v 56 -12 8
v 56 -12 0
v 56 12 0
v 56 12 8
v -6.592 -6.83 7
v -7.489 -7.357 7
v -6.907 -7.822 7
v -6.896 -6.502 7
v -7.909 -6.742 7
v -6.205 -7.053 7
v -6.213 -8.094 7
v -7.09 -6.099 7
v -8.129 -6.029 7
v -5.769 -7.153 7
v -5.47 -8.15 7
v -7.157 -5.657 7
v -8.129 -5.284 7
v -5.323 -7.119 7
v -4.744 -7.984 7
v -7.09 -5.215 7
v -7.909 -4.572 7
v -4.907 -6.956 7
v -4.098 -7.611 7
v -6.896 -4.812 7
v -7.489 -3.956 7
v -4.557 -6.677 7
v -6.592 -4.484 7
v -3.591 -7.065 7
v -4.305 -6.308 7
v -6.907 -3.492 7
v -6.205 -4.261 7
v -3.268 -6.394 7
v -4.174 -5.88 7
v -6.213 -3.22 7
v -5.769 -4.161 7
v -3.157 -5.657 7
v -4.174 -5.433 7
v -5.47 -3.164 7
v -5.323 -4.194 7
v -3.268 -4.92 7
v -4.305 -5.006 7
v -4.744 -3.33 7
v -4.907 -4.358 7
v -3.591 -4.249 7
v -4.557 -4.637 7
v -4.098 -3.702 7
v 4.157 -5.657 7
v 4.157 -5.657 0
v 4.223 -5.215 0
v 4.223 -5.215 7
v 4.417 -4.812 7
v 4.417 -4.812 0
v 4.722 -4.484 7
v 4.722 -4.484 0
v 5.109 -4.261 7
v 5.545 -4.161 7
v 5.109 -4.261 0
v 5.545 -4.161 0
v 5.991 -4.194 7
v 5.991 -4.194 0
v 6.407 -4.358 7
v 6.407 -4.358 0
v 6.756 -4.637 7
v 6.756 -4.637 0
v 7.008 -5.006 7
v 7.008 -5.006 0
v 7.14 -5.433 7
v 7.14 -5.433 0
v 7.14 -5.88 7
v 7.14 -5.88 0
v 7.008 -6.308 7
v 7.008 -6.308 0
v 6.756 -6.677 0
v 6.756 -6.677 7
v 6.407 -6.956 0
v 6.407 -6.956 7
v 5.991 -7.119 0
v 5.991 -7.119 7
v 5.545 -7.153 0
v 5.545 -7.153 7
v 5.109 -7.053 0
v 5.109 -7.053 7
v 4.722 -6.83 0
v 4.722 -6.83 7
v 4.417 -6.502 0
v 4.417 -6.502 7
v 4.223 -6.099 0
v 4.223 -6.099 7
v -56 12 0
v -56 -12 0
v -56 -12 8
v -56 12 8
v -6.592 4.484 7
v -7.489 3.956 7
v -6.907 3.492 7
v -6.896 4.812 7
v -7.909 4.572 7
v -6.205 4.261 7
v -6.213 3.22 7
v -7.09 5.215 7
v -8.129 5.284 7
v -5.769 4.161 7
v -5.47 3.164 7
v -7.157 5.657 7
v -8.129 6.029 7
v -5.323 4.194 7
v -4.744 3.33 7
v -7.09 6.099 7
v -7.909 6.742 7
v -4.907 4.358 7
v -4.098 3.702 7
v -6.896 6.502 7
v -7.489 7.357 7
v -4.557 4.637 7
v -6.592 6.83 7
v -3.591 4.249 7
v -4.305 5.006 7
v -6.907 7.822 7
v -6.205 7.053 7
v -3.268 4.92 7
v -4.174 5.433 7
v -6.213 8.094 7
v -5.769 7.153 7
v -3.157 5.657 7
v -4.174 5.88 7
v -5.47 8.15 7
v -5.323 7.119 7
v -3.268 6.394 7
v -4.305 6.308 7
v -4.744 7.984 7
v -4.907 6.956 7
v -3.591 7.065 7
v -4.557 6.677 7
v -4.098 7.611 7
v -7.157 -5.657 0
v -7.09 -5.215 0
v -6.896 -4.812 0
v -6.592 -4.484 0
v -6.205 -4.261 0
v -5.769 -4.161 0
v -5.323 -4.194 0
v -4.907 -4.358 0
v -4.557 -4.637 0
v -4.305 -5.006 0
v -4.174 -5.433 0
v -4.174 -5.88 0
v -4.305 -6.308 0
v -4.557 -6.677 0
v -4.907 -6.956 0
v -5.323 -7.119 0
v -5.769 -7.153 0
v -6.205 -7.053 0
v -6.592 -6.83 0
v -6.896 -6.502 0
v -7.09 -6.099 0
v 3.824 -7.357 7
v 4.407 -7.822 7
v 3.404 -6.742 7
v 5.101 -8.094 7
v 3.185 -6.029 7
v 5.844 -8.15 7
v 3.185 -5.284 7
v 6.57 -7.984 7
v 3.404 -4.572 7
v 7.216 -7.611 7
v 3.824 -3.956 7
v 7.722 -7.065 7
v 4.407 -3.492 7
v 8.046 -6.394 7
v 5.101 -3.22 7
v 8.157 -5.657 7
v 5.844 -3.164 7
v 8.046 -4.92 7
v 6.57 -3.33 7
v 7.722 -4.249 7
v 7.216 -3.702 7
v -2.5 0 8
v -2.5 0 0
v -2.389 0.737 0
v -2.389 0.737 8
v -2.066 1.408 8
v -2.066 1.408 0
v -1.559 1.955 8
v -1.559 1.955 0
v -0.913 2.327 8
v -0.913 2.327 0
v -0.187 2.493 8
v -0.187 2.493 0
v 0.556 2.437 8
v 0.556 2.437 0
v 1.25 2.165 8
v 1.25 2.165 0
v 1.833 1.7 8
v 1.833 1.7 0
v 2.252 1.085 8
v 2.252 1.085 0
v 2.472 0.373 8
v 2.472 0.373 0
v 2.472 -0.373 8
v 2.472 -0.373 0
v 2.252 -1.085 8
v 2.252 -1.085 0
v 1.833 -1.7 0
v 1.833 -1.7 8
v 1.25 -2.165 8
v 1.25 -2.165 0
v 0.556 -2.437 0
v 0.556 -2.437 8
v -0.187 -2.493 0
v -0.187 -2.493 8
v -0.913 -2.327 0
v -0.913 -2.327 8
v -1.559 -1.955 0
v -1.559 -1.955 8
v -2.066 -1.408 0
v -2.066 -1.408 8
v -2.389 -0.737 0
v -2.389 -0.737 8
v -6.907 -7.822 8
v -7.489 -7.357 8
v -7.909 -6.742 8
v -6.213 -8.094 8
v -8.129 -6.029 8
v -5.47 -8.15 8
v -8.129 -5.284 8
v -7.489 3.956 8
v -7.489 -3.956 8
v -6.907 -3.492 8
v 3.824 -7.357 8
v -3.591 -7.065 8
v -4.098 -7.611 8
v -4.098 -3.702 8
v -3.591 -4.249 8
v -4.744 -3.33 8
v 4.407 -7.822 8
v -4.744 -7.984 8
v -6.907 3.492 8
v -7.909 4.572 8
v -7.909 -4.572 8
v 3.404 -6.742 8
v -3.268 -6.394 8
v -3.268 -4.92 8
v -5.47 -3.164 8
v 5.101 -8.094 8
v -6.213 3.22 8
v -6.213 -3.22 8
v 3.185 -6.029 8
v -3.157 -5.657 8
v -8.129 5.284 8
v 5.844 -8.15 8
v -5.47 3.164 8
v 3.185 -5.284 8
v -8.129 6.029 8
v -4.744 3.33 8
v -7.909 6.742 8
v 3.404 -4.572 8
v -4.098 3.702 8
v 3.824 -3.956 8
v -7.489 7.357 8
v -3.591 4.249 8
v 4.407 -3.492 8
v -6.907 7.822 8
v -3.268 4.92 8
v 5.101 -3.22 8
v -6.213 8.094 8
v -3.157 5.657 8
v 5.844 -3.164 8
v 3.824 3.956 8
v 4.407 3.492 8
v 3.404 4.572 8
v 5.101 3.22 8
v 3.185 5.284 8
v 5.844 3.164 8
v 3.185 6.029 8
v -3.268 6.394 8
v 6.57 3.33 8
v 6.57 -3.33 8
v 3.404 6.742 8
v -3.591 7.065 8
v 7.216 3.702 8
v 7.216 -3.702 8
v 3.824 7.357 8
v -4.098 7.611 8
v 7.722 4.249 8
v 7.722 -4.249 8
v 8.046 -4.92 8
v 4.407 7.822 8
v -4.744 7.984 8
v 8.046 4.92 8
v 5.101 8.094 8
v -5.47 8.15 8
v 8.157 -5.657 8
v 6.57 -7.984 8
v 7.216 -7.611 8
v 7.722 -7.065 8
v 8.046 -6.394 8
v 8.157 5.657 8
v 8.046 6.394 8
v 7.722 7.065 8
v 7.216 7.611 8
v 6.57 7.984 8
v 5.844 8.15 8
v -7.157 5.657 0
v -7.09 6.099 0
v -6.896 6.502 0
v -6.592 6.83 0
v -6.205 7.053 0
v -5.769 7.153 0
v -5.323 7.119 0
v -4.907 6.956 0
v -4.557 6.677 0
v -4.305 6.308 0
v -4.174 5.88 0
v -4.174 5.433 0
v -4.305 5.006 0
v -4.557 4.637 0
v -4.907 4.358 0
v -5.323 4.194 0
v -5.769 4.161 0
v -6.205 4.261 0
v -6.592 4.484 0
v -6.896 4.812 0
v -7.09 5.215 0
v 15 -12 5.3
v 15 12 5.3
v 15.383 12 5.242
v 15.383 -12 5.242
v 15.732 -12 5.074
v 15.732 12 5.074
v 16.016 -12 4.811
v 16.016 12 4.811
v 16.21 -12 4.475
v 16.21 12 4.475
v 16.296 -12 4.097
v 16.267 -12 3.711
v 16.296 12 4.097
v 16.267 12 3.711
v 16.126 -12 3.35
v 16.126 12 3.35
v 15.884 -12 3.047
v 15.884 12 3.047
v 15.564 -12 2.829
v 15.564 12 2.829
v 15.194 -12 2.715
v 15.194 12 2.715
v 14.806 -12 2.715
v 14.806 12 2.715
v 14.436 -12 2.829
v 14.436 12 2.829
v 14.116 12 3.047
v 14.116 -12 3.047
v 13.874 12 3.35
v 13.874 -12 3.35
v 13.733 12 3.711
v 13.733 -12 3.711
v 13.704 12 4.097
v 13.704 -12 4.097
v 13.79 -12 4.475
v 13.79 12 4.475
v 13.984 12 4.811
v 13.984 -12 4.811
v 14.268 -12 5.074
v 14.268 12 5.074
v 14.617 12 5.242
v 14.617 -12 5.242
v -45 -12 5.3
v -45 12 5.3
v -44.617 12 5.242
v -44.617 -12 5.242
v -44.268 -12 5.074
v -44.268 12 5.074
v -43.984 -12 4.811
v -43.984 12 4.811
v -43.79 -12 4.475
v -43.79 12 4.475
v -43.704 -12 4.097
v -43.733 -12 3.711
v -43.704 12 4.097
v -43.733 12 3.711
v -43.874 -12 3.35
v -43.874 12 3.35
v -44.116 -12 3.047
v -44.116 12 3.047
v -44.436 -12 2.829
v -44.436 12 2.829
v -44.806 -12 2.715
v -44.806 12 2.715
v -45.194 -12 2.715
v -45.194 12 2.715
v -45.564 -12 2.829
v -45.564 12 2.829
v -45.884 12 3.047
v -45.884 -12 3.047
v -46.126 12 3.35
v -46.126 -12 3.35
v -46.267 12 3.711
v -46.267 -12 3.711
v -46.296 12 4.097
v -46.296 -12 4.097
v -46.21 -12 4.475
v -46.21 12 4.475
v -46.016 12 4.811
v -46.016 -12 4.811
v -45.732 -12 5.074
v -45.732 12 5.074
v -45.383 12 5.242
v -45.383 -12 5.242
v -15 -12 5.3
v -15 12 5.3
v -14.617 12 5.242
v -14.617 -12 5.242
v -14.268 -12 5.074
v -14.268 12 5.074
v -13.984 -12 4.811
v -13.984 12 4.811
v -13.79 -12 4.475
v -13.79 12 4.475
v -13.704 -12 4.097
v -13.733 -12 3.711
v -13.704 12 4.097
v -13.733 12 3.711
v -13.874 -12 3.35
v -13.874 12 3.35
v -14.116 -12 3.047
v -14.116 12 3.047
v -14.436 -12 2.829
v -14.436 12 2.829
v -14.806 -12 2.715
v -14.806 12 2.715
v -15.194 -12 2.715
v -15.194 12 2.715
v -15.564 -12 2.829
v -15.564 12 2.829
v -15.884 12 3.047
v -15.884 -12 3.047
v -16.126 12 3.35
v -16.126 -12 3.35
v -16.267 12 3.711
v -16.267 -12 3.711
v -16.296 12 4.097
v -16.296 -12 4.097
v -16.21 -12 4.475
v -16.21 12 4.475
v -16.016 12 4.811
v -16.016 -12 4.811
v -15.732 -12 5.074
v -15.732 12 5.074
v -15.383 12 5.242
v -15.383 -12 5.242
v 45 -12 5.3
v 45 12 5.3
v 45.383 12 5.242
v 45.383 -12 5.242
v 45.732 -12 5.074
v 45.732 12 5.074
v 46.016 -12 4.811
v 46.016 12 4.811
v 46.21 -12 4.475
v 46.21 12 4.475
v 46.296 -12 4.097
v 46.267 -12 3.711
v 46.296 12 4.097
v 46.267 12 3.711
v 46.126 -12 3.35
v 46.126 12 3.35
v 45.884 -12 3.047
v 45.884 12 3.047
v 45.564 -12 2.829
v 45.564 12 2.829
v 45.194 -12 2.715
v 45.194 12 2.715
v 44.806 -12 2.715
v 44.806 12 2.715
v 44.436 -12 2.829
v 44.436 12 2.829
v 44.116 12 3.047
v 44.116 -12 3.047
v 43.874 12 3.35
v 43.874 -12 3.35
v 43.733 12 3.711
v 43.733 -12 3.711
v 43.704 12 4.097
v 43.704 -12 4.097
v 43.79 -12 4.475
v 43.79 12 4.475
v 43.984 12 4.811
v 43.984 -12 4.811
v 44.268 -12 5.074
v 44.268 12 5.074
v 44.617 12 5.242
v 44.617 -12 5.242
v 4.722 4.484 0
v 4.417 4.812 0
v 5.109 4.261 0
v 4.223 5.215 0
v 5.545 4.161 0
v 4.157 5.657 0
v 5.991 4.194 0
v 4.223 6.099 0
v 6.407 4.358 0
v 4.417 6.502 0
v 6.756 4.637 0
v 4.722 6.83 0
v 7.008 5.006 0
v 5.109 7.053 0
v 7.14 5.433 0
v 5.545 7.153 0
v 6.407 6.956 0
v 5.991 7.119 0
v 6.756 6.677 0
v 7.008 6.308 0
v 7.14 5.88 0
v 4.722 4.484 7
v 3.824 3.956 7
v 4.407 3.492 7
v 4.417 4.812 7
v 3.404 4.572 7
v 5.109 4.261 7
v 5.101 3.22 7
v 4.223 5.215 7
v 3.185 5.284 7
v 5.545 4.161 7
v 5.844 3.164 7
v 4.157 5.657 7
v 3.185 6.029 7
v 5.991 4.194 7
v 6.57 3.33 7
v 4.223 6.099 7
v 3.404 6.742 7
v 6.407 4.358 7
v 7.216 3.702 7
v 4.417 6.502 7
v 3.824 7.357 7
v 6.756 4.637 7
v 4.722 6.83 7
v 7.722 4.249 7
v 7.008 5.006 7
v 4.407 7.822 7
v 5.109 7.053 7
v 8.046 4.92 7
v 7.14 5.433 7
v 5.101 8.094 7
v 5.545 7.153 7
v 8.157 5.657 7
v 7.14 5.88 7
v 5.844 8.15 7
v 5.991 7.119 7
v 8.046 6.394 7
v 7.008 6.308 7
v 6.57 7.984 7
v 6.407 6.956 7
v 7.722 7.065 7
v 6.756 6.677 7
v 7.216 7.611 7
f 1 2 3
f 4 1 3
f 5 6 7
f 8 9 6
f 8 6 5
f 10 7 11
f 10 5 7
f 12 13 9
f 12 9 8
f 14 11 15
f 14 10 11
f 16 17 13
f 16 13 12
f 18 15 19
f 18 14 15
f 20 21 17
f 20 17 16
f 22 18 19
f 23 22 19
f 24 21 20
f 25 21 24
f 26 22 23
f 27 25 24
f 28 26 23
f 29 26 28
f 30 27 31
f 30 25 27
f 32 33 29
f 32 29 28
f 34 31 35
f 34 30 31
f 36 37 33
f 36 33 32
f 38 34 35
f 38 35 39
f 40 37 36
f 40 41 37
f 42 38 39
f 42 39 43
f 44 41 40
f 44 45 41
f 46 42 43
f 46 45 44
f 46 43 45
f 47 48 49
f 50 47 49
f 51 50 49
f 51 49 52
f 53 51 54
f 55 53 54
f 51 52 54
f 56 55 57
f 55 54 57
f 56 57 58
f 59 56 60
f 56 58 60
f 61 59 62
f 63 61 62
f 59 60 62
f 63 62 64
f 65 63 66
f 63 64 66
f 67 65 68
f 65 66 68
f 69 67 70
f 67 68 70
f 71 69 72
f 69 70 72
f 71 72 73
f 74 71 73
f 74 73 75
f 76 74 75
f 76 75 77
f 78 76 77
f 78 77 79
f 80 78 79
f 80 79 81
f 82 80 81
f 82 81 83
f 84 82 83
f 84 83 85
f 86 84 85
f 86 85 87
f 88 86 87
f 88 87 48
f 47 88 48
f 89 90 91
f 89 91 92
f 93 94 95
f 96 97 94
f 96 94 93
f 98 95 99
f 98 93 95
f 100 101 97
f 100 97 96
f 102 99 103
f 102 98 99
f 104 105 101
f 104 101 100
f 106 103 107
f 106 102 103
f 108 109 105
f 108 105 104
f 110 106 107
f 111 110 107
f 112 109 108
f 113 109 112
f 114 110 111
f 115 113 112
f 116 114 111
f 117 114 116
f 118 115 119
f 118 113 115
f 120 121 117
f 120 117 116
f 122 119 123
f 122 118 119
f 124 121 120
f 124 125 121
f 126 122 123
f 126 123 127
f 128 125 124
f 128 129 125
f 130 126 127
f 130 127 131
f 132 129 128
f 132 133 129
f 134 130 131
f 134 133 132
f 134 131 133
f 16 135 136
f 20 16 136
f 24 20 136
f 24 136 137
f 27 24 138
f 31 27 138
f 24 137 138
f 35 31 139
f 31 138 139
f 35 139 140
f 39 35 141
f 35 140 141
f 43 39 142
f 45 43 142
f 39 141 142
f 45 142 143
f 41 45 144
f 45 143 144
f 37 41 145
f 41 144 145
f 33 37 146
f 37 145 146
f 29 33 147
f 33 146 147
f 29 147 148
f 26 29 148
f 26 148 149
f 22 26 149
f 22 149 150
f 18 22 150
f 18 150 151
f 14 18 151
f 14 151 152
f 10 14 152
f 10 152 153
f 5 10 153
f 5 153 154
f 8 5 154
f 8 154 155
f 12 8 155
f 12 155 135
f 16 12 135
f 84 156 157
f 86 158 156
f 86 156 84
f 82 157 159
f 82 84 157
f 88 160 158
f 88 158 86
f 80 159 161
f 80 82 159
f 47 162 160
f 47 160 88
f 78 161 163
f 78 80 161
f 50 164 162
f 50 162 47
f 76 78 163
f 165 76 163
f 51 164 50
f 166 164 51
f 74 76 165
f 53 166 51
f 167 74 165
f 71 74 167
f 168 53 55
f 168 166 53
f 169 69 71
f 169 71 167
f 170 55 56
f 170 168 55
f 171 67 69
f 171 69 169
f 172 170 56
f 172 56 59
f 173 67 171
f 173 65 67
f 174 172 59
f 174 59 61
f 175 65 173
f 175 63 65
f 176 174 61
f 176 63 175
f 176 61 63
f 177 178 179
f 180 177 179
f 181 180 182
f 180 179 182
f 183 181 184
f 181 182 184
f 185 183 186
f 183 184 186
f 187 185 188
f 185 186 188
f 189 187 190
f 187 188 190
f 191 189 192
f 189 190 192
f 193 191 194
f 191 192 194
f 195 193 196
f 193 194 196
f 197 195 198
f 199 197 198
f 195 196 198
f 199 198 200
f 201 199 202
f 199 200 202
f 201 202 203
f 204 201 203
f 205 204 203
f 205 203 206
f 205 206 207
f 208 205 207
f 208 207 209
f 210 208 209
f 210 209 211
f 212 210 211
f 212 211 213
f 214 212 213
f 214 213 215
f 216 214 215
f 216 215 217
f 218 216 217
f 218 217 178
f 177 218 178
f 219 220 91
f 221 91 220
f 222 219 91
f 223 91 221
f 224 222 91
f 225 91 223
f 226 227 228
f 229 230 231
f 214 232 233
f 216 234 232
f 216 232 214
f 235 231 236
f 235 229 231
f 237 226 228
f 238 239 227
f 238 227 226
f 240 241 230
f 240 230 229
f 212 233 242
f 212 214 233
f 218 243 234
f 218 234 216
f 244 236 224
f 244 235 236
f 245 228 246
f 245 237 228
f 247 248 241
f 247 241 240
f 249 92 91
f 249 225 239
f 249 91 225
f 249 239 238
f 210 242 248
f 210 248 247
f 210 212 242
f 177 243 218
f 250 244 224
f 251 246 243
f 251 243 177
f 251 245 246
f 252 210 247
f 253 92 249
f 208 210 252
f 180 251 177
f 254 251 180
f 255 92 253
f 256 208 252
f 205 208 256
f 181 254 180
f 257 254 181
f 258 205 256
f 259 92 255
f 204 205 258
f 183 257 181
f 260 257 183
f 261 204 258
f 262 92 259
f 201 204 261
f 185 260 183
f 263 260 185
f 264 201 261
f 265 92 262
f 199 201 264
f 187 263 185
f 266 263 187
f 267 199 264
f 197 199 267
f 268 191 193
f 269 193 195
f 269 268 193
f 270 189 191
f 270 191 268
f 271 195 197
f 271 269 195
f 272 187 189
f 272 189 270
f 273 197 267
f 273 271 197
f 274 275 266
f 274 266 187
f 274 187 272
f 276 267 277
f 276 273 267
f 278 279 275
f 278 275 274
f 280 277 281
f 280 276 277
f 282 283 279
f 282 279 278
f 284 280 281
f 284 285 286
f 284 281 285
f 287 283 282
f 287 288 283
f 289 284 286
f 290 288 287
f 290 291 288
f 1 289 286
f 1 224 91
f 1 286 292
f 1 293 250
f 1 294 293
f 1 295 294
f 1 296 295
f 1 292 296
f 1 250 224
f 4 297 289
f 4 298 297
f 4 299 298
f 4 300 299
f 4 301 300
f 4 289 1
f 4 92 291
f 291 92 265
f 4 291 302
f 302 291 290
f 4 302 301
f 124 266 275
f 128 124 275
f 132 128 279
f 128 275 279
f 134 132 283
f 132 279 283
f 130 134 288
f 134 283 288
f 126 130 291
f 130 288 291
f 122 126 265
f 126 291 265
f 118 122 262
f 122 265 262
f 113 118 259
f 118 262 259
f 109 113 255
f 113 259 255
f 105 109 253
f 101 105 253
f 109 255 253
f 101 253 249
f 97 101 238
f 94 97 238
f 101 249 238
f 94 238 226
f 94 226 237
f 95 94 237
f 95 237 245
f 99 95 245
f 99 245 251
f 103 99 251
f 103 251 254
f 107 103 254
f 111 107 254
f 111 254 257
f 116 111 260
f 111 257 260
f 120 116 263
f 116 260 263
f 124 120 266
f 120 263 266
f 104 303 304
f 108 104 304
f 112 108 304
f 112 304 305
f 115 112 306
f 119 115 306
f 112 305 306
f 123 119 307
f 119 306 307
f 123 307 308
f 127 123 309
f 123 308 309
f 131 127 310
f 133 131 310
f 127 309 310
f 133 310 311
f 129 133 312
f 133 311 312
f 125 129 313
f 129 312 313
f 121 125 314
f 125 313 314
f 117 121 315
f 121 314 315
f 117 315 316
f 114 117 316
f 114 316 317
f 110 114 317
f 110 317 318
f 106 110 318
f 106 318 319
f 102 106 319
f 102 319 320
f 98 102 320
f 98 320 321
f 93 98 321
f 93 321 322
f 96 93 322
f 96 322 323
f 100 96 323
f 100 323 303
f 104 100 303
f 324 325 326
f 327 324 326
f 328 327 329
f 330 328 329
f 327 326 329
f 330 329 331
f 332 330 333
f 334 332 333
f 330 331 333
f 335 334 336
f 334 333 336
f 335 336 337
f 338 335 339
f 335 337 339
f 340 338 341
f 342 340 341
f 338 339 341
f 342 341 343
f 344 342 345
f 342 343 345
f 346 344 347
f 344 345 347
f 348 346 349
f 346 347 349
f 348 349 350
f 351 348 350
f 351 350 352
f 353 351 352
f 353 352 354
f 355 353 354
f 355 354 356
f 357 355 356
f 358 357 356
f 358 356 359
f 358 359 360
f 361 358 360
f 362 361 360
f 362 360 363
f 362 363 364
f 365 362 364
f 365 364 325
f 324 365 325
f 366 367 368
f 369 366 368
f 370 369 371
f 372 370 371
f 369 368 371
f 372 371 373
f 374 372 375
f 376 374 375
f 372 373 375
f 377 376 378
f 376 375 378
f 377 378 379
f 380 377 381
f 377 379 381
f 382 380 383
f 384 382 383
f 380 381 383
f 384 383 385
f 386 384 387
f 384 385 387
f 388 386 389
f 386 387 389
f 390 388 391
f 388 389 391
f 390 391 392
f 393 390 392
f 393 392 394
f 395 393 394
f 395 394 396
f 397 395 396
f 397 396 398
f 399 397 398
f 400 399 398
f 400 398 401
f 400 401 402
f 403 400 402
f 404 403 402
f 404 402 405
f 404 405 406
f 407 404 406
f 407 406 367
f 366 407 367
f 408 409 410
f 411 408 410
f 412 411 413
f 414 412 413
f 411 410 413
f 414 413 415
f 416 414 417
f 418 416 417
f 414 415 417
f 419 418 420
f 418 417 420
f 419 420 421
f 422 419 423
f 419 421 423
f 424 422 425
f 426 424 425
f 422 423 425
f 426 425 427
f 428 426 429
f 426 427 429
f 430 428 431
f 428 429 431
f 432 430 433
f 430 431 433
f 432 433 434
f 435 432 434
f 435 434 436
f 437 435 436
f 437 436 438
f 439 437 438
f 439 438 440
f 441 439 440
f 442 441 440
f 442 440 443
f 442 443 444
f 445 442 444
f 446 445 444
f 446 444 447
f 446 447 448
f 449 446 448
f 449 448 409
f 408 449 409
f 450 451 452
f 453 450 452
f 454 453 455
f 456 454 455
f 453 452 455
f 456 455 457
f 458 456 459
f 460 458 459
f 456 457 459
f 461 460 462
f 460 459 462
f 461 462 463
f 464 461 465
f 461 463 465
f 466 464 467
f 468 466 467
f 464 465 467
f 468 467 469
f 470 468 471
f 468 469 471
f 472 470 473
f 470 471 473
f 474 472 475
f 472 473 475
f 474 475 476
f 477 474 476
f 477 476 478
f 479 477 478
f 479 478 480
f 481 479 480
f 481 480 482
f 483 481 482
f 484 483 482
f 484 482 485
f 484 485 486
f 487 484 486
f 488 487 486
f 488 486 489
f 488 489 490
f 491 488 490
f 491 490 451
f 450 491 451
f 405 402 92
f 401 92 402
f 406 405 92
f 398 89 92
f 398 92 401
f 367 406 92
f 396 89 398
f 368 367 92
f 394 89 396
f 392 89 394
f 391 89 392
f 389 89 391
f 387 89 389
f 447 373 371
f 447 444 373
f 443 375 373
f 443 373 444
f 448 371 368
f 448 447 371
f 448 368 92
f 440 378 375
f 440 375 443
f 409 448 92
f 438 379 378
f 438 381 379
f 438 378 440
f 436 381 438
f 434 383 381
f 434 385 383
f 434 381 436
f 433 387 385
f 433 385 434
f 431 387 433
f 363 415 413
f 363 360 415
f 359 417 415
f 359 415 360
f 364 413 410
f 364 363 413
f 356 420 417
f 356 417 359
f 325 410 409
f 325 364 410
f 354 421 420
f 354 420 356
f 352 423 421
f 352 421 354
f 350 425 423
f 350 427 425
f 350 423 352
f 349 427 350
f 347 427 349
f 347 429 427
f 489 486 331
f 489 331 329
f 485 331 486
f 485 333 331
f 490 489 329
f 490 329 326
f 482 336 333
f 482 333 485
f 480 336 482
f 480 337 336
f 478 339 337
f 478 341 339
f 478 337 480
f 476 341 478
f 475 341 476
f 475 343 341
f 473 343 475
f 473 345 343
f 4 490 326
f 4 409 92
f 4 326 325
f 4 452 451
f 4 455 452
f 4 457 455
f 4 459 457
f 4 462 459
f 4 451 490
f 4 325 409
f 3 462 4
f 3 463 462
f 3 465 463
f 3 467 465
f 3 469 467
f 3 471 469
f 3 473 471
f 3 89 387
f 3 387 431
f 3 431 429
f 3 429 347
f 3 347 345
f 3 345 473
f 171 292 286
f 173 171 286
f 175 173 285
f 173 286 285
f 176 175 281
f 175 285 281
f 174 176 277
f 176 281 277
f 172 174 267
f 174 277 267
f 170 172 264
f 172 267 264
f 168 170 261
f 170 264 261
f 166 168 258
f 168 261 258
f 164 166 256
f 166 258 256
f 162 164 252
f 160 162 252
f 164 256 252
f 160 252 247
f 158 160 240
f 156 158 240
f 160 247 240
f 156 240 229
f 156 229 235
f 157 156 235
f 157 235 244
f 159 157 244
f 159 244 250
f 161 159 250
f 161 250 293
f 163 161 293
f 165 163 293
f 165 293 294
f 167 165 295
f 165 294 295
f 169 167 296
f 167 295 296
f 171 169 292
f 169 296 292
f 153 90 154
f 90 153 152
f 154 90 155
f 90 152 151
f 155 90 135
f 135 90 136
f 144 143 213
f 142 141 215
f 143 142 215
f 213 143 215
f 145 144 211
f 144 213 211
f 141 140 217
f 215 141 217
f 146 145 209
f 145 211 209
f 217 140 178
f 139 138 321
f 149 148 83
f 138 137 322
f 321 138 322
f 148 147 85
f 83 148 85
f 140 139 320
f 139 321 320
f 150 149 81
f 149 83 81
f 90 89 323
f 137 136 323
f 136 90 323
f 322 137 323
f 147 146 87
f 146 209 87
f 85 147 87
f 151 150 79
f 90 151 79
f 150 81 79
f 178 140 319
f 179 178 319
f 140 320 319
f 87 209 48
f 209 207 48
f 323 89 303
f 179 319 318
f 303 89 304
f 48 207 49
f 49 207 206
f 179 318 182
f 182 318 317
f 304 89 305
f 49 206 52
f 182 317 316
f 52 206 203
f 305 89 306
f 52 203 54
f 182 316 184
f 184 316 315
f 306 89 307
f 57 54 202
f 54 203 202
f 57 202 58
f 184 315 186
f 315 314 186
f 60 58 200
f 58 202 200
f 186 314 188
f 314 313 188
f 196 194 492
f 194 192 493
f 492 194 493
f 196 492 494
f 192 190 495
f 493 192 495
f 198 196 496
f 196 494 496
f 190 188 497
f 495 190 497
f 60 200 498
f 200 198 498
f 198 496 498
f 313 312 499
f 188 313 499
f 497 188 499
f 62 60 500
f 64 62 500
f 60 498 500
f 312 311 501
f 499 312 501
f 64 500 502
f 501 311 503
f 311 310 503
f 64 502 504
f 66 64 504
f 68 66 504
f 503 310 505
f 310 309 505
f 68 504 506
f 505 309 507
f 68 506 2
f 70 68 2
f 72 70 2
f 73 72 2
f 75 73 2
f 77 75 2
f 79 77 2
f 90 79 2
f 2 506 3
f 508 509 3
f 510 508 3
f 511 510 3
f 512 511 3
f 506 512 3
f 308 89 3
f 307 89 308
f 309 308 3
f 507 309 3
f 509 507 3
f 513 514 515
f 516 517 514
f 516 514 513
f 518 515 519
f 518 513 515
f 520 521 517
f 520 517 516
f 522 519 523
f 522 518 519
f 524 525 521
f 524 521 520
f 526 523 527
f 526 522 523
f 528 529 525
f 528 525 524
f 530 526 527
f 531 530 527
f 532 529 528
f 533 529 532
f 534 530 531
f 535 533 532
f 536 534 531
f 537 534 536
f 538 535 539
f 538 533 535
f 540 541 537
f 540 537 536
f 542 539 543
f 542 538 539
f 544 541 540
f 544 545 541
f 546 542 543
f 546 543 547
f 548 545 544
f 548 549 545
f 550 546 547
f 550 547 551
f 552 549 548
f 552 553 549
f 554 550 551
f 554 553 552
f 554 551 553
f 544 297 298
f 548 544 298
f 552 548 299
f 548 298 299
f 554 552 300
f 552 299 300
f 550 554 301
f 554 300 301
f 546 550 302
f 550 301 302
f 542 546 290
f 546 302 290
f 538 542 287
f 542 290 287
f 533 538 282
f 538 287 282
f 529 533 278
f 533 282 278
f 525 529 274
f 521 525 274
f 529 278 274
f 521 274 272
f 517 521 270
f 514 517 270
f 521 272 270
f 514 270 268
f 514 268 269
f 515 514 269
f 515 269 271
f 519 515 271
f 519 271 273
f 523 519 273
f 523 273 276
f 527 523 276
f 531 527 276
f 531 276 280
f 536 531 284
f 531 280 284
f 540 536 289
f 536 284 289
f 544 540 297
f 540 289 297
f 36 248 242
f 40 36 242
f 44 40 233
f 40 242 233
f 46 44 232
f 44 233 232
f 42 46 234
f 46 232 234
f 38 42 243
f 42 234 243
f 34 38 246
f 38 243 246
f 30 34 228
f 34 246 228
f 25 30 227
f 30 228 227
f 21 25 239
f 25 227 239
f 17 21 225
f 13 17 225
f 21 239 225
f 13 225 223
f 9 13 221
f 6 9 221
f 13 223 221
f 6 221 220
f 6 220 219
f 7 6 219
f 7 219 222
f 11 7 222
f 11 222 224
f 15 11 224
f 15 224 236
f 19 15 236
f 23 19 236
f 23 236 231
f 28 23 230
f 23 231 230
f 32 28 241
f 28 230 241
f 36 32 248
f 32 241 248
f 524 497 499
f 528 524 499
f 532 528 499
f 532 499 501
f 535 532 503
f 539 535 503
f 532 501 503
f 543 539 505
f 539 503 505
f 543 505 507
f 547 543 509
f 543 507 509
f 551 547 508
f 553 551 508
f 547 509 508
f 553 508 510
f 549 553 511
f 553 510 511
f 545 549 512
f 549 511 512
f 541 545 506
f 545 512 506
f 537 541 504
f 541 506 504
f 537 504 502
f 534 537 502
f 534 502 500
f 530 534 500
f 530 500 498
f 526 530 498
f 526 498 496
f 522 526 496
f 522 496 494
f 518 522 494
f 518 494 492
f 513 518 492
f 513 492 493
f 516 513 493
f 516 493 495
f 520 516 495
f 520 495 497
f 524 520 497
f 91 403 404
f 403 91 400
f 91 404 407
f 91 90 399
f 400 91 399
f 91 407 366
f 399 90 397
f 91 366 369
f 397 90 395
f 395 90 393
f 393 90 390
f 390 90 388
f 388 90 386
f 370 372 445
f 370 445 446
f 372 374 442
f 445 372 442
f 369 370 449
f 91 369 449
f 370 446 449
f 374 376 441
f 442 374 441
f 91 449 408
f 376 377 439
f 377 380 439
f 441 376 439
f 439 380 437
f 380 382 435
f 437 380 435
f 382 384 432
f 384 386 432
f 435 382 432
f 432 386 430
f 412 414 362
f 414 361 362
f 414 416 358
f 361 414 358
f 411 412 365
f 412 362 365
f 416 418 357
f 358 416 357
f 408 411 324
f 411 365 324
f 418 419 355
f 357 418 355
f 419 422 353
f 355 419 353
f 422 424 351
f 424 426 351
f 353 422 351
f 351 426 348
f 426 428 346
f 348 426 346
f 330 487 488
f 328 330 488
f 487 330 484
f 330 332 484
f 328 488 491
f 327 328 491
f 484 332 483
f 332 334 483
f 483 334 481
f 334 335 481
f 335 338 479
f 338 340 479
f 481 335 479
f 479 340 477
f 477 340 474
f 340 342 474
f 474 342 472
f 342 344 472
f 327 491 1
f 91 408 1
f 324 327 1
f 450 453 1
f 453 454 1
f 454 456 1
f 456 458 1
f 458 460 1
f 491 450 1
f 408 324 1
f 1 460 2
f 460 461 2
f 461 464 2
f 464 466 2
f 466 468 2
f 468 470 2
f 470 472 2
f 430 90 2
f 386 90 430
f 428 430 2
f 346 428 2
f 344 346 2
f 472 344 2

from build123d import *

# Parameters (mm, degrees)
SKETCH_1_W          = 112
SKETCH_1_H          = 24
EXTRUDE_1_DEPTH     = 8
SKETCH_2_R          = 1.3
CUT_EXTRUDE_1_DEPTH = 30
SKETCH_3_R          = 2.5
SKETCH_3_R_2        = 1.5
CUT_EXTRUDE_2_DEPTH = 58.827329179
SKETCH_5_R          = 2.5
CUT_EXTRUDE_4_DEPTH = 1


with BuildPart() as part:
    # 草图1 → 凸台-拉伸1 (new body)
    with BuildSketch(Plane.XY):
        Rectangle(SKETCH_1_W, SKETCH_1_H)
    extrude(amount=EXTRUDE_1_DEPTH)

    # 草图2 → 切除-拉伸1 (cut)
    with BuildSketch(Plane(origin=(0, 12, 0), x_dir=(1, 0, 0), z_dir=(0, 1, 0))):
        with Locations(Location((-15, -4, 0), (0, 0, 270))):
            Circle(SKETCH_2_R)
        with Locations(Location((-45, -4, 0), (0, 0, 270))):
            Circle(SKETCH_2_R)
        with Locations(Location((45, -4, 0), (0, 0, 270))):
            Circle(SKETCH_2_R)
        with Locations(Location((15, -4, 0), (0, 0, 270))):
            Circle(SKETCH_2_R)
    extrude(amount=-CUT_EXTRUDE_1_DEPTH, mode=Mode.SUBTRACT)

    # 草图3 → 切除-拉伸2 (cut, through all)
    with BuildSketch(Plane(origin=(0, 0, 0), x_dir=(-1, 0, 0), z_dir=(0, 0, -1))):
        Circle(SKETCH_3_R)
        with Locations((-5.656854249, -5.656854249)):
            Circle(SKETCH_3_R_2)
        with Locations((-5.656854249, 5.656854249)):
            Circle(SKETCH_3_R_2)
        with Locations((5.656854249, 5.656854249)):
            Circle(SKETCH_3_R_2)
        with Locations((5.656854249, -5.656854249)):
            Circle(SKETCH_3_R_2)
    extrude(amount=-CUT_EXTRUDE_2_DEPTH, mode=Mode.SUBTRACT)

    # 草图5 → 切除-拉伸4 (cut)
    with BuildSketch(Plane.XY.offset(8)):
        with Locations((-5.656854249, -5.656854249)):
            Circle(SKETCH_5_R)
        with Locations((5.656854249, -5.656854249)):
            Circle(SKETCH_5_R)
        with Locations((5.656854249, 5.656854249)):
            Circle(SKETCH_5_R)
        with Locations((-5.656854249, 5.656854249)):
            Circle(SKETCH_5_R)
    extrude(amount=-CUT_EXTRUDE_4_DEPTH, mode=Mode.SUBTRACT)


solid = part.part
